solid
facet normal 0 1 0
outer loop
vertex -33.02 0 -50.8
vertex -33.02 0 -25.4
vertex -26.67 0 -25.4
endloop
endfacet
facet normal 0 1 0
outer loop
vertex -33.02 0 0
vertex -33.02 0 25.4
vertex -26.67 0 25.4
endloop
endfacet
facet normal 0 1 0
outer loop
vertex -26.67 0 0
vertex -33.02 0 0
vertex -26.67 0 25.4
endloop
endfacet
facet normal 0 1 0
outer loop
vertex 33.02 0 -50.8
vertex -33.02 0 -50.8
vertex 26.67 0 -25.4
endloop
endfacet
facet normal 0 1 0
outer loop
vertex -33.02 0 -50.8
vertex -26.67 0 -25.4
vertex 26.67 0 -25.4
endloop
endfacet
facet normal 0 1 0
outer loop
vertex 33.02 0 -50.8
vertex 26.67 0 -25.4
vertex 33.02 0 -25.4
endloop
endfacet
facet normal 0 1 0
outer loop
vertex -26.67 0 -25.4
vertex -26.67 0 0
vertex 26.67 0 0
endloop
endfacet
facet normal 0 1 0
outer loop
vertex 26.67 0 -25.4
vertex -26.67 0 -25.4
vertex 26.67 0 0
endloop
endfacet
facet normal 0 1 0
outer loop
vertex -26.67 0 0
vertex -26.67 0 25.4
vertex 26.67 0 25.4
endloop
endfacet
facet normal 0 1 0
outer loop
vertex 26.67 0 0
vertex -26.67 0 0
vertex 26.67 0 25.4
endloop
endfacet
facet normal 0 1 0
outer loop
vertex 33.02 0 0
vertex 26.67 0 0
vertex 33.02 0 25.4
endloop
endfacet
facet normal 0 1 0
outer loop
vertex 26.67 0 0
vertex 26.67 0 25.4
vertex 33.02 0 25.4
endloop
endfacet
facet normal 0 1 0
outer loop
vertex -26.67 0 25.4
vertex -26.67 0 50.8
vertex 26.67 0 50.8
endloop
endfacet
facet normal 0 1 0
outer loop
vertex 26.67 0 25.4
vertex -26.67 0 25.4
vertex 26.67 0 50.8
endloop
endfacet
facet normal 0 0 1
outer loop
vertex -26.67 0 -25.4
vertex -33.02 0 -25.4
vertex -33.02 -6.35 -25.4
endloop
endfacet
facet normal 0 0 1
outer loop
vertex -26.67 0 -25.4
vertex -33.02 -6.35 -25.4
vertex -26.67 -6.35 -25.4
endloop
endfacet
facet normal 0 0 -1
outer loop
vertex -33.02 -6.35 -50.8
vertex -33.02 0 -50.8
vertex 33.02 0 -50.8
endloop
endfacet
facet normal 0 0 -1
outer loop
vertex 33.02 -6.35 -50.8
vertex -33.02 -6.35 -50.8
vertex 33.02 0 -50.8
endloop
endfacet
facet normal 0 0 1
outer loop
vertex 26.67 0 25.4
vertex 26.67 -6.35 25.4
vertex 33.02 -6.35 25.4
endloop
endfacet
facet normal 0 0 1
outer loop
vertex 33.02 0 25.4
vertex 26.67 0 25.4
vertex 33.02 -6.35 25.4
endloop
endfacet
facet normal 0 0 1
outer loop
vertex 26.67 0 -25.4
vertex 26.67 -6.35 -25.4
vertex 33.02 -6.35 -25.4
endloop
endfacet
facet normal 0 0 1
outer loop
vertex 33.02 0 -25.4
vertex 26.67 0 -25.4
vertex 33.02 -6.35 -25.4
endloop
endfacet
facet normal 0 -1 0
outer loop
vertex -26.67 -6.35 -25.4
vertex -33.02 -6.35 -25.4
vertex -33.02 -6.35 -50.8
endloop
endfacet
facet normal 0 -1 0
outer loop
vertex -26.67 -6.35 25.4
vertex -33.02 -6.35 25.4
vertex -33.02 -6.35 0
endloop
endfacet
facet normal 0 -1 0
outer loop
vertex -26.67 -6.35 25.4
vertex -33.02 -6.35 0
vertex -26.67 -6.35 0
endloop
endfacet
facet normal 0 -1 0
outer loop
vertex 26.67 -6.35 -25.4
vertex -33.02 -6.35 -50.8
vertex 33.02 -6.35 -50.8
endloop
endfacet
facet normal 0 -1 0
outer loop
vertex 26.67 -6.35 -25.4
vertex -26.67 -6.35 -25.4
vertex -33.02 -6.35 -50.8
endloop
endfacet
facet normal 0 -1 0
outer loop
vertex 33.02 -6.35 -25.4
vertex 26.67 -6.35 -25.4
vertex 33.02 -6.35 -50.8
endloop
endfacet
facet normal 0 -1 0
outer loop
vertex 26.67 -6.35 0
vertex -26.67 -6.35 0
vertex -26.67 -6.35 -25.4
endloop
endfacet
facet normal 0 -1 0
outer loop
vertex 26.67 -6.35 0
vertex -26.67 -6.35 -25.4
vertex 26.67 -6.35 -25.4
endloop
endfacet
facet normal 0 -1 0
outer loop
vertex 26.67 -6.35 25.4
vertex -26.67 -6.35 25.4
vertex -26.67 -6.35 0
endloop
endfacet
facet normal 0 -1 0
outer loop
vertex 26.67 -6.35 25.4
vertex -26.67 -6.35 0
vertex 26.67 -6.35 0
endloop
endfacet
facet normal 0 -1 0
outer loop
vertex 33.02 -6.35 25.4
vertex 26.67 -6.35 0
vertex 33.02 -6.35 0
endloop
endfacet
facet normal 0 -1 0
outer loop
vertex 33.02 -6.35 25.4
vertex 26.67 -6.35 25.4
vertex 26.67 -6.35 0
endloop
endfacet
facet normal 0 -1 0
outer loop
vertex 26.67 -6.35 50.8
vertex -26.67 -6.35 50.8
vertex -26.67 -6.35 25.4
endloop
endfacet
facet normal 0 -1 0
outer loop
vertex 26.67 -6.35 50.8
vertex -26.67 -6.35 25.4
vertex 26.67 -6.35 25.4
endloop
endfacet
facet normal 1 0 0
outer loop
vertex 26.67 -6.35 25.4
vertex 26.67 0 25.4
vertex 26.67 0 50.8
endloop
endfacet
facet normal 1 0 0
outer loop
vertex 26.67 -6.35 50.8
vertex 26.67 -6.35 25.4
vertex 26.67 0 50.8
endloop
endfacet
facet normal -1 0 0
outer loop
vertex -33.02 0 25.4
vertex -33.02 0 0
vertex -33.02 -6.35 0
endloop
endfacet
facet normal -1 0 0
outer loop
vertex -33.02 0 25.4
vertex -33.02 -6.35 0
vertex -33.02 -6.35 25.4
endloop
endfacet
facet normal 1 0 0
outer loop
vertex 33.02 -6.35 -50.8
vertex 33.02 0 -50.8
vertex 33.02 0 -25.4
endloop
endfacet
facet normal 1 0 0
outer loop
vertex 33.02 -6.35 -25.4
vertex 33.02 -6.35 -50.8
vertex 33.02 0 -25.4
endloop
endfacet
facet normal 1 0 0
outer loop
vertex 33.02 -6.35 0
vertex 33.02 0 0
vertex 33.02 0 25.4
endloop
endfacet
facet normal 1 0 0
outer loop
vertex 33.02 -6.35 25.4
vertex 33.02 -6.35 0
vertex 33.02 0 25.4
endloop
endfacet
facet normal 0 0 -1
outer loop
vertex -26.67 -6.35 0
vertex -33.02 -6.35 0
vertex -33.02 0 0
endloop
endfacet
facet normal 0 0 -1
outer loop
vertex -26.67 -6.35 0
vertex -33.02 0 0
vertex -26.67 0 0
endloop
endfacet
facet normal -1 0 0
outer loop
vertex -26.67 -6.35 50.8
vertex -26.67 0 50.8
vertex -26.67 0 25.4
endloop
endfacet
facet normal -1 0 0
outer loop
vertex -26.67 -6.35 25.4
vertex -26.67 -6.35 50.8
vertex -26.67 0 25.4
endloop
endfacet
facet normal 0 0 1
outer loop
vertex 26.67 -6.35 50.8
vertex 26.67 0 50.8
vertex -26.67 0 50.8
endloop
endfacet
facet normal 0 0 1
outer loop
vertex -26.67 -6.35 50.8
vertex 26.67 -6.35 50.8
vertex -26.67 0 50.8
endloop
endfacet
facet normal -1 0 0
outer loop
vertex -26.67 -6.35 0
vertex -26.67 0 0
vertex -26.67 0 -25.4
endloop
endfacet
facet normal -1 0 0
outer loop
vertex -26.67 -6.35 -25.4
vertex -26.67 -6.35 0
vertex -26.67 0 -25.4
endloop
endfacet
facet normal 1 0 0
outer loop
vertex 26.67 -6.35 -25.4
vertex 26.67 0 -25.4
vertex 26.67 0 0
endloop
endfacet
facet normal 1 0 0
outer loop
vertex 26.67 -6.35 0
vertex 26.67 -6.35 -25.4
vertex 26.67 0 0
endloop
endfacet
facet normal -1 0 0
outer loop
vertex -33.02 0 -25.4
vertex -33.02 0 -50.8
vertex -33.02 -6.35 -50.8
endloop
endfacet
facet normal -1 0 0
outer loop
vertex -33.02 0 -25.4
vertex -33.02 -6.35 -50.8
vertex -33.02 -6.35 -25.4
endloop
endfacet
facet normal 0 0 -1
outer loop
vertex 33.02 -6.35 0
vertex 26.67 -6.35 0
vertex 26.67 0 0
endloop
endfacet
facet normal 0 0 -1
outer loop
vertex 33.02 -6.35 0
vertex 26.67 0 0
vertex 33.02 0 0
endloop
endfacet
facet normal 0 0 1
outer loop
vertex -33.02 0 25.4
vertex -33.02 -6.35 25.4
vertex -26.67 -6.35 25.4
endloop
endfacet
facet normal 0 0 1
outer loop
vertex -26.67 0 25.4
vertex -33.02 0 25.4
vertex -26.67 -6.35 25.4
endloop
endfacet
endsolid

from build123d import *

# Parameters (mm, degrees)
F0_W     = 6.35
F0_H     = 25.4
F1_DEPTH = 6.35


with BuildPart() as f1:
    # F0 (on Front) → F1 (new body)
    with BuildSketch(Plane.XZ):
        with Locations((-29.845, 12.7)):
            Rectangle(F0_W, F0_H)
        Polygon((-26.67, -50.8), (26.67, -50.8), (26.67, -25.4), (26.67, 0), (26.67, 25.4), (26.67, 50.8), (-26.67, 50.8), (-26.67, 25.4), (-26.67, 0), (-26.67, -25.4), align=None)
        with Locations((29.845, 12.7)):
            Rectangle(F0_W, F0_H)
        with Locations((29.845, -38.1)):
            Rectangle(F0_W, F0_H)
        with Locations((-29.845, -38.1)):
            Rectangle(F0_W, F0_H)
    extrude(amount=F1_DEPTH)


solid = f1.part
